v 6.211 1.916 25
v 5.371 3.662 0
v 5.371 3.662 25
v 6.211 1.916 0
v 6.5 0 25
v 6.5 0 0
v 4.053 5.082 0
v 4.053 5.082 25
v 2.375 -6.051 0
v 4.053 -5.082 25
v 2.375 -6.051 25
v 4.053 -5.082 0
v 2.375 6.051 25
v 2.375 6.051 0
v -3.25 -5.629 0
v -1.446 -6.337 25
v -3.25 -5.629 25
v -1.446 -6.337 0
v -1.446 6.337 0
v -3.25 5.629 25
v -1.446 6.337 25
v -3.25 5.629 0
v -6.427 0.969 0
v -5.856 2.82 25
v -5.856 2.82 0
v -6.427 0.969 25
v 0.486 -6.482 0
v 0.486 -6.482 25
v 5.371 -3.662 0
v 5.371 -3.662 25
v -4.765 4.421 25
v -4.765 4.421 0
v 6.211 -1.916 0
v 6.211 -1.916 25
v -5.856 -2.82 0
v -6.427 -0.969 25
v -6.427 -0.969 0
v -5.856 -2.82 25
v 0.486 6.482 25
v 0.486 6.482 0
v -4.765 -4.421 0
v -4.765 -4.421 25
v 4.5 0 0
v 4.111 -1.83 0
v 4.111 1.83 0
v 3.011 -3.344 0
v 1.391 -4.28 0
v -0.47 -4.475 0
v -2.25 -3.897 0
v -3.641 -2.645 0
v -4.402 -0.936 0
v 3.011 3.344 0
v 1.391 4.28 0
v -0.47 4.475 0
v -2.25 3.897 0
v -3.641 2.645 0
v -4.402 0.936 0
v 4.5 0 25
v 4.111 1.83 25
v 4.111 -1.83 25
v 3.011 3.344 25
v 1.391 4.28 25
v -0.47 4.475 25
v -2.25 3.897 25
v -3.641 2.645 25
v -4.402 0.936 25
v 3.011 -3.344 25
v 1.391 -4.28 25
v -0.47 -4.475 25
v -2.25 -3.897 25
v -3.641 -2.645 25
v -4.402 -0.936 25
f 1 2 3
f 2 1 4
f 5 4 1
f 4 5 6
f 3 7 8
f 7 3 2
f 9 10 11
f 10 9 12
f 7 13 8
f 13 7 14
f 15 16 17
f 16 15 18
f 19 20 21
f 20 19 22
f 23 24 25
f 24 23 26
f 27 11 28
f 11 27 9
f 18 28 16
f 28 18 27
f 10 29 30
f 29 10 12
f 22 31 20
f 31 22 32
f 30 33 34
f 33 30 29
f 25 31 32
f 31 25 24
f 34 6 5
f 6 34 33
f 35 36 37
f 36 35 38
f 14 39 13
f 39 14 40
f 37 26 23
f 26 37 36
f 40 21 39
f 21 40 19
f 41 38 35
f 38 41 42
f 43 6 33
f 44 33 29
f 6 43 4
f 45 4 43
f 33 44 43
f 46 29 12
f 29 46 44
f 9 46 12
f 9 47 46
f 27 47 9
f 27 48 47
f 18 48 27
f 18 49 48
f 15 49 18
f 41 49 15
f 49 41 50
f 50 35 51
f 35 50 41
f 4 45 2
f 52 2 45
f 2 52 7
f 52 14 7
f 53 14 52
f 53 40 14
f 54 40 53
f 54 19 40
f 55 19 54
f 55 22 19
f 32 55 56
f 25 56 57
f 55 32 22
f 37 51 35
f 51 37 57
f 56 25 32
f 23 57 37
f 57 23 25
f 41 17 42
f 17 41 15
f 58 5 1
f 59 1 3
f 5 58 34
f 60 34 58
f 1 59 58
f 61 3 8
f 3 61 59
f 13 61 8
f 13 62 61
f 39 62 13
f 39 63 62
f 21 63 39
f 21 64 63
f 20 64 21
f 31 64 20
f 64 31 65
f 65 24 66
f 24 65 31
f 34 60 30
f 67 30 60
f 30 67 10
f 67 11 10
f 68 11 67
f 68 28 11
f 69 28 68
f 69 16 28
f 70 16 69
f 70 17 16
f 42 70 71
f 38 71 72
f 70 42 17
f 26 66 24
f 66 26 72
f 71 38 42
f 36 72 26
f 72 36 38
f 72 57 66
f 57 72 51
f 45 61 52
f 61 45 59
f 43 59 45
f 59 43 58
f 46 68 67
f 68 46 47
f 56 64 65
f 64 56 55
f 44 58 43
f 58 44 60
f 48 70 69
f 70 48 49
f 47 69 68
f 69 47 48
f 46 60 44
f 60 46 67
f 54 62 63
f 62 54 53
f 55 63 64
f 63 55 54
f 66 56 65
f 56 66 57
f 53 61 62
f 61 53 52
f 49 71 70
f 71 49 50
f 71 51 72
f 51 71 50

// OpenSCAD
// file: steering_spacer.scad
module SteeringSpacer(h)
{
  difference()
  {
    cylinder(h=h, d=13);

    translate([0, 0, -1])
    {
      cylinder(h=h+2, d=9);
    }
  }
}
// main file
use <steering_spacer.scad>

module SteeringSpacerNormal()
{
  SteeringSpacer(25);
}

SteeringSpacerNormal();
